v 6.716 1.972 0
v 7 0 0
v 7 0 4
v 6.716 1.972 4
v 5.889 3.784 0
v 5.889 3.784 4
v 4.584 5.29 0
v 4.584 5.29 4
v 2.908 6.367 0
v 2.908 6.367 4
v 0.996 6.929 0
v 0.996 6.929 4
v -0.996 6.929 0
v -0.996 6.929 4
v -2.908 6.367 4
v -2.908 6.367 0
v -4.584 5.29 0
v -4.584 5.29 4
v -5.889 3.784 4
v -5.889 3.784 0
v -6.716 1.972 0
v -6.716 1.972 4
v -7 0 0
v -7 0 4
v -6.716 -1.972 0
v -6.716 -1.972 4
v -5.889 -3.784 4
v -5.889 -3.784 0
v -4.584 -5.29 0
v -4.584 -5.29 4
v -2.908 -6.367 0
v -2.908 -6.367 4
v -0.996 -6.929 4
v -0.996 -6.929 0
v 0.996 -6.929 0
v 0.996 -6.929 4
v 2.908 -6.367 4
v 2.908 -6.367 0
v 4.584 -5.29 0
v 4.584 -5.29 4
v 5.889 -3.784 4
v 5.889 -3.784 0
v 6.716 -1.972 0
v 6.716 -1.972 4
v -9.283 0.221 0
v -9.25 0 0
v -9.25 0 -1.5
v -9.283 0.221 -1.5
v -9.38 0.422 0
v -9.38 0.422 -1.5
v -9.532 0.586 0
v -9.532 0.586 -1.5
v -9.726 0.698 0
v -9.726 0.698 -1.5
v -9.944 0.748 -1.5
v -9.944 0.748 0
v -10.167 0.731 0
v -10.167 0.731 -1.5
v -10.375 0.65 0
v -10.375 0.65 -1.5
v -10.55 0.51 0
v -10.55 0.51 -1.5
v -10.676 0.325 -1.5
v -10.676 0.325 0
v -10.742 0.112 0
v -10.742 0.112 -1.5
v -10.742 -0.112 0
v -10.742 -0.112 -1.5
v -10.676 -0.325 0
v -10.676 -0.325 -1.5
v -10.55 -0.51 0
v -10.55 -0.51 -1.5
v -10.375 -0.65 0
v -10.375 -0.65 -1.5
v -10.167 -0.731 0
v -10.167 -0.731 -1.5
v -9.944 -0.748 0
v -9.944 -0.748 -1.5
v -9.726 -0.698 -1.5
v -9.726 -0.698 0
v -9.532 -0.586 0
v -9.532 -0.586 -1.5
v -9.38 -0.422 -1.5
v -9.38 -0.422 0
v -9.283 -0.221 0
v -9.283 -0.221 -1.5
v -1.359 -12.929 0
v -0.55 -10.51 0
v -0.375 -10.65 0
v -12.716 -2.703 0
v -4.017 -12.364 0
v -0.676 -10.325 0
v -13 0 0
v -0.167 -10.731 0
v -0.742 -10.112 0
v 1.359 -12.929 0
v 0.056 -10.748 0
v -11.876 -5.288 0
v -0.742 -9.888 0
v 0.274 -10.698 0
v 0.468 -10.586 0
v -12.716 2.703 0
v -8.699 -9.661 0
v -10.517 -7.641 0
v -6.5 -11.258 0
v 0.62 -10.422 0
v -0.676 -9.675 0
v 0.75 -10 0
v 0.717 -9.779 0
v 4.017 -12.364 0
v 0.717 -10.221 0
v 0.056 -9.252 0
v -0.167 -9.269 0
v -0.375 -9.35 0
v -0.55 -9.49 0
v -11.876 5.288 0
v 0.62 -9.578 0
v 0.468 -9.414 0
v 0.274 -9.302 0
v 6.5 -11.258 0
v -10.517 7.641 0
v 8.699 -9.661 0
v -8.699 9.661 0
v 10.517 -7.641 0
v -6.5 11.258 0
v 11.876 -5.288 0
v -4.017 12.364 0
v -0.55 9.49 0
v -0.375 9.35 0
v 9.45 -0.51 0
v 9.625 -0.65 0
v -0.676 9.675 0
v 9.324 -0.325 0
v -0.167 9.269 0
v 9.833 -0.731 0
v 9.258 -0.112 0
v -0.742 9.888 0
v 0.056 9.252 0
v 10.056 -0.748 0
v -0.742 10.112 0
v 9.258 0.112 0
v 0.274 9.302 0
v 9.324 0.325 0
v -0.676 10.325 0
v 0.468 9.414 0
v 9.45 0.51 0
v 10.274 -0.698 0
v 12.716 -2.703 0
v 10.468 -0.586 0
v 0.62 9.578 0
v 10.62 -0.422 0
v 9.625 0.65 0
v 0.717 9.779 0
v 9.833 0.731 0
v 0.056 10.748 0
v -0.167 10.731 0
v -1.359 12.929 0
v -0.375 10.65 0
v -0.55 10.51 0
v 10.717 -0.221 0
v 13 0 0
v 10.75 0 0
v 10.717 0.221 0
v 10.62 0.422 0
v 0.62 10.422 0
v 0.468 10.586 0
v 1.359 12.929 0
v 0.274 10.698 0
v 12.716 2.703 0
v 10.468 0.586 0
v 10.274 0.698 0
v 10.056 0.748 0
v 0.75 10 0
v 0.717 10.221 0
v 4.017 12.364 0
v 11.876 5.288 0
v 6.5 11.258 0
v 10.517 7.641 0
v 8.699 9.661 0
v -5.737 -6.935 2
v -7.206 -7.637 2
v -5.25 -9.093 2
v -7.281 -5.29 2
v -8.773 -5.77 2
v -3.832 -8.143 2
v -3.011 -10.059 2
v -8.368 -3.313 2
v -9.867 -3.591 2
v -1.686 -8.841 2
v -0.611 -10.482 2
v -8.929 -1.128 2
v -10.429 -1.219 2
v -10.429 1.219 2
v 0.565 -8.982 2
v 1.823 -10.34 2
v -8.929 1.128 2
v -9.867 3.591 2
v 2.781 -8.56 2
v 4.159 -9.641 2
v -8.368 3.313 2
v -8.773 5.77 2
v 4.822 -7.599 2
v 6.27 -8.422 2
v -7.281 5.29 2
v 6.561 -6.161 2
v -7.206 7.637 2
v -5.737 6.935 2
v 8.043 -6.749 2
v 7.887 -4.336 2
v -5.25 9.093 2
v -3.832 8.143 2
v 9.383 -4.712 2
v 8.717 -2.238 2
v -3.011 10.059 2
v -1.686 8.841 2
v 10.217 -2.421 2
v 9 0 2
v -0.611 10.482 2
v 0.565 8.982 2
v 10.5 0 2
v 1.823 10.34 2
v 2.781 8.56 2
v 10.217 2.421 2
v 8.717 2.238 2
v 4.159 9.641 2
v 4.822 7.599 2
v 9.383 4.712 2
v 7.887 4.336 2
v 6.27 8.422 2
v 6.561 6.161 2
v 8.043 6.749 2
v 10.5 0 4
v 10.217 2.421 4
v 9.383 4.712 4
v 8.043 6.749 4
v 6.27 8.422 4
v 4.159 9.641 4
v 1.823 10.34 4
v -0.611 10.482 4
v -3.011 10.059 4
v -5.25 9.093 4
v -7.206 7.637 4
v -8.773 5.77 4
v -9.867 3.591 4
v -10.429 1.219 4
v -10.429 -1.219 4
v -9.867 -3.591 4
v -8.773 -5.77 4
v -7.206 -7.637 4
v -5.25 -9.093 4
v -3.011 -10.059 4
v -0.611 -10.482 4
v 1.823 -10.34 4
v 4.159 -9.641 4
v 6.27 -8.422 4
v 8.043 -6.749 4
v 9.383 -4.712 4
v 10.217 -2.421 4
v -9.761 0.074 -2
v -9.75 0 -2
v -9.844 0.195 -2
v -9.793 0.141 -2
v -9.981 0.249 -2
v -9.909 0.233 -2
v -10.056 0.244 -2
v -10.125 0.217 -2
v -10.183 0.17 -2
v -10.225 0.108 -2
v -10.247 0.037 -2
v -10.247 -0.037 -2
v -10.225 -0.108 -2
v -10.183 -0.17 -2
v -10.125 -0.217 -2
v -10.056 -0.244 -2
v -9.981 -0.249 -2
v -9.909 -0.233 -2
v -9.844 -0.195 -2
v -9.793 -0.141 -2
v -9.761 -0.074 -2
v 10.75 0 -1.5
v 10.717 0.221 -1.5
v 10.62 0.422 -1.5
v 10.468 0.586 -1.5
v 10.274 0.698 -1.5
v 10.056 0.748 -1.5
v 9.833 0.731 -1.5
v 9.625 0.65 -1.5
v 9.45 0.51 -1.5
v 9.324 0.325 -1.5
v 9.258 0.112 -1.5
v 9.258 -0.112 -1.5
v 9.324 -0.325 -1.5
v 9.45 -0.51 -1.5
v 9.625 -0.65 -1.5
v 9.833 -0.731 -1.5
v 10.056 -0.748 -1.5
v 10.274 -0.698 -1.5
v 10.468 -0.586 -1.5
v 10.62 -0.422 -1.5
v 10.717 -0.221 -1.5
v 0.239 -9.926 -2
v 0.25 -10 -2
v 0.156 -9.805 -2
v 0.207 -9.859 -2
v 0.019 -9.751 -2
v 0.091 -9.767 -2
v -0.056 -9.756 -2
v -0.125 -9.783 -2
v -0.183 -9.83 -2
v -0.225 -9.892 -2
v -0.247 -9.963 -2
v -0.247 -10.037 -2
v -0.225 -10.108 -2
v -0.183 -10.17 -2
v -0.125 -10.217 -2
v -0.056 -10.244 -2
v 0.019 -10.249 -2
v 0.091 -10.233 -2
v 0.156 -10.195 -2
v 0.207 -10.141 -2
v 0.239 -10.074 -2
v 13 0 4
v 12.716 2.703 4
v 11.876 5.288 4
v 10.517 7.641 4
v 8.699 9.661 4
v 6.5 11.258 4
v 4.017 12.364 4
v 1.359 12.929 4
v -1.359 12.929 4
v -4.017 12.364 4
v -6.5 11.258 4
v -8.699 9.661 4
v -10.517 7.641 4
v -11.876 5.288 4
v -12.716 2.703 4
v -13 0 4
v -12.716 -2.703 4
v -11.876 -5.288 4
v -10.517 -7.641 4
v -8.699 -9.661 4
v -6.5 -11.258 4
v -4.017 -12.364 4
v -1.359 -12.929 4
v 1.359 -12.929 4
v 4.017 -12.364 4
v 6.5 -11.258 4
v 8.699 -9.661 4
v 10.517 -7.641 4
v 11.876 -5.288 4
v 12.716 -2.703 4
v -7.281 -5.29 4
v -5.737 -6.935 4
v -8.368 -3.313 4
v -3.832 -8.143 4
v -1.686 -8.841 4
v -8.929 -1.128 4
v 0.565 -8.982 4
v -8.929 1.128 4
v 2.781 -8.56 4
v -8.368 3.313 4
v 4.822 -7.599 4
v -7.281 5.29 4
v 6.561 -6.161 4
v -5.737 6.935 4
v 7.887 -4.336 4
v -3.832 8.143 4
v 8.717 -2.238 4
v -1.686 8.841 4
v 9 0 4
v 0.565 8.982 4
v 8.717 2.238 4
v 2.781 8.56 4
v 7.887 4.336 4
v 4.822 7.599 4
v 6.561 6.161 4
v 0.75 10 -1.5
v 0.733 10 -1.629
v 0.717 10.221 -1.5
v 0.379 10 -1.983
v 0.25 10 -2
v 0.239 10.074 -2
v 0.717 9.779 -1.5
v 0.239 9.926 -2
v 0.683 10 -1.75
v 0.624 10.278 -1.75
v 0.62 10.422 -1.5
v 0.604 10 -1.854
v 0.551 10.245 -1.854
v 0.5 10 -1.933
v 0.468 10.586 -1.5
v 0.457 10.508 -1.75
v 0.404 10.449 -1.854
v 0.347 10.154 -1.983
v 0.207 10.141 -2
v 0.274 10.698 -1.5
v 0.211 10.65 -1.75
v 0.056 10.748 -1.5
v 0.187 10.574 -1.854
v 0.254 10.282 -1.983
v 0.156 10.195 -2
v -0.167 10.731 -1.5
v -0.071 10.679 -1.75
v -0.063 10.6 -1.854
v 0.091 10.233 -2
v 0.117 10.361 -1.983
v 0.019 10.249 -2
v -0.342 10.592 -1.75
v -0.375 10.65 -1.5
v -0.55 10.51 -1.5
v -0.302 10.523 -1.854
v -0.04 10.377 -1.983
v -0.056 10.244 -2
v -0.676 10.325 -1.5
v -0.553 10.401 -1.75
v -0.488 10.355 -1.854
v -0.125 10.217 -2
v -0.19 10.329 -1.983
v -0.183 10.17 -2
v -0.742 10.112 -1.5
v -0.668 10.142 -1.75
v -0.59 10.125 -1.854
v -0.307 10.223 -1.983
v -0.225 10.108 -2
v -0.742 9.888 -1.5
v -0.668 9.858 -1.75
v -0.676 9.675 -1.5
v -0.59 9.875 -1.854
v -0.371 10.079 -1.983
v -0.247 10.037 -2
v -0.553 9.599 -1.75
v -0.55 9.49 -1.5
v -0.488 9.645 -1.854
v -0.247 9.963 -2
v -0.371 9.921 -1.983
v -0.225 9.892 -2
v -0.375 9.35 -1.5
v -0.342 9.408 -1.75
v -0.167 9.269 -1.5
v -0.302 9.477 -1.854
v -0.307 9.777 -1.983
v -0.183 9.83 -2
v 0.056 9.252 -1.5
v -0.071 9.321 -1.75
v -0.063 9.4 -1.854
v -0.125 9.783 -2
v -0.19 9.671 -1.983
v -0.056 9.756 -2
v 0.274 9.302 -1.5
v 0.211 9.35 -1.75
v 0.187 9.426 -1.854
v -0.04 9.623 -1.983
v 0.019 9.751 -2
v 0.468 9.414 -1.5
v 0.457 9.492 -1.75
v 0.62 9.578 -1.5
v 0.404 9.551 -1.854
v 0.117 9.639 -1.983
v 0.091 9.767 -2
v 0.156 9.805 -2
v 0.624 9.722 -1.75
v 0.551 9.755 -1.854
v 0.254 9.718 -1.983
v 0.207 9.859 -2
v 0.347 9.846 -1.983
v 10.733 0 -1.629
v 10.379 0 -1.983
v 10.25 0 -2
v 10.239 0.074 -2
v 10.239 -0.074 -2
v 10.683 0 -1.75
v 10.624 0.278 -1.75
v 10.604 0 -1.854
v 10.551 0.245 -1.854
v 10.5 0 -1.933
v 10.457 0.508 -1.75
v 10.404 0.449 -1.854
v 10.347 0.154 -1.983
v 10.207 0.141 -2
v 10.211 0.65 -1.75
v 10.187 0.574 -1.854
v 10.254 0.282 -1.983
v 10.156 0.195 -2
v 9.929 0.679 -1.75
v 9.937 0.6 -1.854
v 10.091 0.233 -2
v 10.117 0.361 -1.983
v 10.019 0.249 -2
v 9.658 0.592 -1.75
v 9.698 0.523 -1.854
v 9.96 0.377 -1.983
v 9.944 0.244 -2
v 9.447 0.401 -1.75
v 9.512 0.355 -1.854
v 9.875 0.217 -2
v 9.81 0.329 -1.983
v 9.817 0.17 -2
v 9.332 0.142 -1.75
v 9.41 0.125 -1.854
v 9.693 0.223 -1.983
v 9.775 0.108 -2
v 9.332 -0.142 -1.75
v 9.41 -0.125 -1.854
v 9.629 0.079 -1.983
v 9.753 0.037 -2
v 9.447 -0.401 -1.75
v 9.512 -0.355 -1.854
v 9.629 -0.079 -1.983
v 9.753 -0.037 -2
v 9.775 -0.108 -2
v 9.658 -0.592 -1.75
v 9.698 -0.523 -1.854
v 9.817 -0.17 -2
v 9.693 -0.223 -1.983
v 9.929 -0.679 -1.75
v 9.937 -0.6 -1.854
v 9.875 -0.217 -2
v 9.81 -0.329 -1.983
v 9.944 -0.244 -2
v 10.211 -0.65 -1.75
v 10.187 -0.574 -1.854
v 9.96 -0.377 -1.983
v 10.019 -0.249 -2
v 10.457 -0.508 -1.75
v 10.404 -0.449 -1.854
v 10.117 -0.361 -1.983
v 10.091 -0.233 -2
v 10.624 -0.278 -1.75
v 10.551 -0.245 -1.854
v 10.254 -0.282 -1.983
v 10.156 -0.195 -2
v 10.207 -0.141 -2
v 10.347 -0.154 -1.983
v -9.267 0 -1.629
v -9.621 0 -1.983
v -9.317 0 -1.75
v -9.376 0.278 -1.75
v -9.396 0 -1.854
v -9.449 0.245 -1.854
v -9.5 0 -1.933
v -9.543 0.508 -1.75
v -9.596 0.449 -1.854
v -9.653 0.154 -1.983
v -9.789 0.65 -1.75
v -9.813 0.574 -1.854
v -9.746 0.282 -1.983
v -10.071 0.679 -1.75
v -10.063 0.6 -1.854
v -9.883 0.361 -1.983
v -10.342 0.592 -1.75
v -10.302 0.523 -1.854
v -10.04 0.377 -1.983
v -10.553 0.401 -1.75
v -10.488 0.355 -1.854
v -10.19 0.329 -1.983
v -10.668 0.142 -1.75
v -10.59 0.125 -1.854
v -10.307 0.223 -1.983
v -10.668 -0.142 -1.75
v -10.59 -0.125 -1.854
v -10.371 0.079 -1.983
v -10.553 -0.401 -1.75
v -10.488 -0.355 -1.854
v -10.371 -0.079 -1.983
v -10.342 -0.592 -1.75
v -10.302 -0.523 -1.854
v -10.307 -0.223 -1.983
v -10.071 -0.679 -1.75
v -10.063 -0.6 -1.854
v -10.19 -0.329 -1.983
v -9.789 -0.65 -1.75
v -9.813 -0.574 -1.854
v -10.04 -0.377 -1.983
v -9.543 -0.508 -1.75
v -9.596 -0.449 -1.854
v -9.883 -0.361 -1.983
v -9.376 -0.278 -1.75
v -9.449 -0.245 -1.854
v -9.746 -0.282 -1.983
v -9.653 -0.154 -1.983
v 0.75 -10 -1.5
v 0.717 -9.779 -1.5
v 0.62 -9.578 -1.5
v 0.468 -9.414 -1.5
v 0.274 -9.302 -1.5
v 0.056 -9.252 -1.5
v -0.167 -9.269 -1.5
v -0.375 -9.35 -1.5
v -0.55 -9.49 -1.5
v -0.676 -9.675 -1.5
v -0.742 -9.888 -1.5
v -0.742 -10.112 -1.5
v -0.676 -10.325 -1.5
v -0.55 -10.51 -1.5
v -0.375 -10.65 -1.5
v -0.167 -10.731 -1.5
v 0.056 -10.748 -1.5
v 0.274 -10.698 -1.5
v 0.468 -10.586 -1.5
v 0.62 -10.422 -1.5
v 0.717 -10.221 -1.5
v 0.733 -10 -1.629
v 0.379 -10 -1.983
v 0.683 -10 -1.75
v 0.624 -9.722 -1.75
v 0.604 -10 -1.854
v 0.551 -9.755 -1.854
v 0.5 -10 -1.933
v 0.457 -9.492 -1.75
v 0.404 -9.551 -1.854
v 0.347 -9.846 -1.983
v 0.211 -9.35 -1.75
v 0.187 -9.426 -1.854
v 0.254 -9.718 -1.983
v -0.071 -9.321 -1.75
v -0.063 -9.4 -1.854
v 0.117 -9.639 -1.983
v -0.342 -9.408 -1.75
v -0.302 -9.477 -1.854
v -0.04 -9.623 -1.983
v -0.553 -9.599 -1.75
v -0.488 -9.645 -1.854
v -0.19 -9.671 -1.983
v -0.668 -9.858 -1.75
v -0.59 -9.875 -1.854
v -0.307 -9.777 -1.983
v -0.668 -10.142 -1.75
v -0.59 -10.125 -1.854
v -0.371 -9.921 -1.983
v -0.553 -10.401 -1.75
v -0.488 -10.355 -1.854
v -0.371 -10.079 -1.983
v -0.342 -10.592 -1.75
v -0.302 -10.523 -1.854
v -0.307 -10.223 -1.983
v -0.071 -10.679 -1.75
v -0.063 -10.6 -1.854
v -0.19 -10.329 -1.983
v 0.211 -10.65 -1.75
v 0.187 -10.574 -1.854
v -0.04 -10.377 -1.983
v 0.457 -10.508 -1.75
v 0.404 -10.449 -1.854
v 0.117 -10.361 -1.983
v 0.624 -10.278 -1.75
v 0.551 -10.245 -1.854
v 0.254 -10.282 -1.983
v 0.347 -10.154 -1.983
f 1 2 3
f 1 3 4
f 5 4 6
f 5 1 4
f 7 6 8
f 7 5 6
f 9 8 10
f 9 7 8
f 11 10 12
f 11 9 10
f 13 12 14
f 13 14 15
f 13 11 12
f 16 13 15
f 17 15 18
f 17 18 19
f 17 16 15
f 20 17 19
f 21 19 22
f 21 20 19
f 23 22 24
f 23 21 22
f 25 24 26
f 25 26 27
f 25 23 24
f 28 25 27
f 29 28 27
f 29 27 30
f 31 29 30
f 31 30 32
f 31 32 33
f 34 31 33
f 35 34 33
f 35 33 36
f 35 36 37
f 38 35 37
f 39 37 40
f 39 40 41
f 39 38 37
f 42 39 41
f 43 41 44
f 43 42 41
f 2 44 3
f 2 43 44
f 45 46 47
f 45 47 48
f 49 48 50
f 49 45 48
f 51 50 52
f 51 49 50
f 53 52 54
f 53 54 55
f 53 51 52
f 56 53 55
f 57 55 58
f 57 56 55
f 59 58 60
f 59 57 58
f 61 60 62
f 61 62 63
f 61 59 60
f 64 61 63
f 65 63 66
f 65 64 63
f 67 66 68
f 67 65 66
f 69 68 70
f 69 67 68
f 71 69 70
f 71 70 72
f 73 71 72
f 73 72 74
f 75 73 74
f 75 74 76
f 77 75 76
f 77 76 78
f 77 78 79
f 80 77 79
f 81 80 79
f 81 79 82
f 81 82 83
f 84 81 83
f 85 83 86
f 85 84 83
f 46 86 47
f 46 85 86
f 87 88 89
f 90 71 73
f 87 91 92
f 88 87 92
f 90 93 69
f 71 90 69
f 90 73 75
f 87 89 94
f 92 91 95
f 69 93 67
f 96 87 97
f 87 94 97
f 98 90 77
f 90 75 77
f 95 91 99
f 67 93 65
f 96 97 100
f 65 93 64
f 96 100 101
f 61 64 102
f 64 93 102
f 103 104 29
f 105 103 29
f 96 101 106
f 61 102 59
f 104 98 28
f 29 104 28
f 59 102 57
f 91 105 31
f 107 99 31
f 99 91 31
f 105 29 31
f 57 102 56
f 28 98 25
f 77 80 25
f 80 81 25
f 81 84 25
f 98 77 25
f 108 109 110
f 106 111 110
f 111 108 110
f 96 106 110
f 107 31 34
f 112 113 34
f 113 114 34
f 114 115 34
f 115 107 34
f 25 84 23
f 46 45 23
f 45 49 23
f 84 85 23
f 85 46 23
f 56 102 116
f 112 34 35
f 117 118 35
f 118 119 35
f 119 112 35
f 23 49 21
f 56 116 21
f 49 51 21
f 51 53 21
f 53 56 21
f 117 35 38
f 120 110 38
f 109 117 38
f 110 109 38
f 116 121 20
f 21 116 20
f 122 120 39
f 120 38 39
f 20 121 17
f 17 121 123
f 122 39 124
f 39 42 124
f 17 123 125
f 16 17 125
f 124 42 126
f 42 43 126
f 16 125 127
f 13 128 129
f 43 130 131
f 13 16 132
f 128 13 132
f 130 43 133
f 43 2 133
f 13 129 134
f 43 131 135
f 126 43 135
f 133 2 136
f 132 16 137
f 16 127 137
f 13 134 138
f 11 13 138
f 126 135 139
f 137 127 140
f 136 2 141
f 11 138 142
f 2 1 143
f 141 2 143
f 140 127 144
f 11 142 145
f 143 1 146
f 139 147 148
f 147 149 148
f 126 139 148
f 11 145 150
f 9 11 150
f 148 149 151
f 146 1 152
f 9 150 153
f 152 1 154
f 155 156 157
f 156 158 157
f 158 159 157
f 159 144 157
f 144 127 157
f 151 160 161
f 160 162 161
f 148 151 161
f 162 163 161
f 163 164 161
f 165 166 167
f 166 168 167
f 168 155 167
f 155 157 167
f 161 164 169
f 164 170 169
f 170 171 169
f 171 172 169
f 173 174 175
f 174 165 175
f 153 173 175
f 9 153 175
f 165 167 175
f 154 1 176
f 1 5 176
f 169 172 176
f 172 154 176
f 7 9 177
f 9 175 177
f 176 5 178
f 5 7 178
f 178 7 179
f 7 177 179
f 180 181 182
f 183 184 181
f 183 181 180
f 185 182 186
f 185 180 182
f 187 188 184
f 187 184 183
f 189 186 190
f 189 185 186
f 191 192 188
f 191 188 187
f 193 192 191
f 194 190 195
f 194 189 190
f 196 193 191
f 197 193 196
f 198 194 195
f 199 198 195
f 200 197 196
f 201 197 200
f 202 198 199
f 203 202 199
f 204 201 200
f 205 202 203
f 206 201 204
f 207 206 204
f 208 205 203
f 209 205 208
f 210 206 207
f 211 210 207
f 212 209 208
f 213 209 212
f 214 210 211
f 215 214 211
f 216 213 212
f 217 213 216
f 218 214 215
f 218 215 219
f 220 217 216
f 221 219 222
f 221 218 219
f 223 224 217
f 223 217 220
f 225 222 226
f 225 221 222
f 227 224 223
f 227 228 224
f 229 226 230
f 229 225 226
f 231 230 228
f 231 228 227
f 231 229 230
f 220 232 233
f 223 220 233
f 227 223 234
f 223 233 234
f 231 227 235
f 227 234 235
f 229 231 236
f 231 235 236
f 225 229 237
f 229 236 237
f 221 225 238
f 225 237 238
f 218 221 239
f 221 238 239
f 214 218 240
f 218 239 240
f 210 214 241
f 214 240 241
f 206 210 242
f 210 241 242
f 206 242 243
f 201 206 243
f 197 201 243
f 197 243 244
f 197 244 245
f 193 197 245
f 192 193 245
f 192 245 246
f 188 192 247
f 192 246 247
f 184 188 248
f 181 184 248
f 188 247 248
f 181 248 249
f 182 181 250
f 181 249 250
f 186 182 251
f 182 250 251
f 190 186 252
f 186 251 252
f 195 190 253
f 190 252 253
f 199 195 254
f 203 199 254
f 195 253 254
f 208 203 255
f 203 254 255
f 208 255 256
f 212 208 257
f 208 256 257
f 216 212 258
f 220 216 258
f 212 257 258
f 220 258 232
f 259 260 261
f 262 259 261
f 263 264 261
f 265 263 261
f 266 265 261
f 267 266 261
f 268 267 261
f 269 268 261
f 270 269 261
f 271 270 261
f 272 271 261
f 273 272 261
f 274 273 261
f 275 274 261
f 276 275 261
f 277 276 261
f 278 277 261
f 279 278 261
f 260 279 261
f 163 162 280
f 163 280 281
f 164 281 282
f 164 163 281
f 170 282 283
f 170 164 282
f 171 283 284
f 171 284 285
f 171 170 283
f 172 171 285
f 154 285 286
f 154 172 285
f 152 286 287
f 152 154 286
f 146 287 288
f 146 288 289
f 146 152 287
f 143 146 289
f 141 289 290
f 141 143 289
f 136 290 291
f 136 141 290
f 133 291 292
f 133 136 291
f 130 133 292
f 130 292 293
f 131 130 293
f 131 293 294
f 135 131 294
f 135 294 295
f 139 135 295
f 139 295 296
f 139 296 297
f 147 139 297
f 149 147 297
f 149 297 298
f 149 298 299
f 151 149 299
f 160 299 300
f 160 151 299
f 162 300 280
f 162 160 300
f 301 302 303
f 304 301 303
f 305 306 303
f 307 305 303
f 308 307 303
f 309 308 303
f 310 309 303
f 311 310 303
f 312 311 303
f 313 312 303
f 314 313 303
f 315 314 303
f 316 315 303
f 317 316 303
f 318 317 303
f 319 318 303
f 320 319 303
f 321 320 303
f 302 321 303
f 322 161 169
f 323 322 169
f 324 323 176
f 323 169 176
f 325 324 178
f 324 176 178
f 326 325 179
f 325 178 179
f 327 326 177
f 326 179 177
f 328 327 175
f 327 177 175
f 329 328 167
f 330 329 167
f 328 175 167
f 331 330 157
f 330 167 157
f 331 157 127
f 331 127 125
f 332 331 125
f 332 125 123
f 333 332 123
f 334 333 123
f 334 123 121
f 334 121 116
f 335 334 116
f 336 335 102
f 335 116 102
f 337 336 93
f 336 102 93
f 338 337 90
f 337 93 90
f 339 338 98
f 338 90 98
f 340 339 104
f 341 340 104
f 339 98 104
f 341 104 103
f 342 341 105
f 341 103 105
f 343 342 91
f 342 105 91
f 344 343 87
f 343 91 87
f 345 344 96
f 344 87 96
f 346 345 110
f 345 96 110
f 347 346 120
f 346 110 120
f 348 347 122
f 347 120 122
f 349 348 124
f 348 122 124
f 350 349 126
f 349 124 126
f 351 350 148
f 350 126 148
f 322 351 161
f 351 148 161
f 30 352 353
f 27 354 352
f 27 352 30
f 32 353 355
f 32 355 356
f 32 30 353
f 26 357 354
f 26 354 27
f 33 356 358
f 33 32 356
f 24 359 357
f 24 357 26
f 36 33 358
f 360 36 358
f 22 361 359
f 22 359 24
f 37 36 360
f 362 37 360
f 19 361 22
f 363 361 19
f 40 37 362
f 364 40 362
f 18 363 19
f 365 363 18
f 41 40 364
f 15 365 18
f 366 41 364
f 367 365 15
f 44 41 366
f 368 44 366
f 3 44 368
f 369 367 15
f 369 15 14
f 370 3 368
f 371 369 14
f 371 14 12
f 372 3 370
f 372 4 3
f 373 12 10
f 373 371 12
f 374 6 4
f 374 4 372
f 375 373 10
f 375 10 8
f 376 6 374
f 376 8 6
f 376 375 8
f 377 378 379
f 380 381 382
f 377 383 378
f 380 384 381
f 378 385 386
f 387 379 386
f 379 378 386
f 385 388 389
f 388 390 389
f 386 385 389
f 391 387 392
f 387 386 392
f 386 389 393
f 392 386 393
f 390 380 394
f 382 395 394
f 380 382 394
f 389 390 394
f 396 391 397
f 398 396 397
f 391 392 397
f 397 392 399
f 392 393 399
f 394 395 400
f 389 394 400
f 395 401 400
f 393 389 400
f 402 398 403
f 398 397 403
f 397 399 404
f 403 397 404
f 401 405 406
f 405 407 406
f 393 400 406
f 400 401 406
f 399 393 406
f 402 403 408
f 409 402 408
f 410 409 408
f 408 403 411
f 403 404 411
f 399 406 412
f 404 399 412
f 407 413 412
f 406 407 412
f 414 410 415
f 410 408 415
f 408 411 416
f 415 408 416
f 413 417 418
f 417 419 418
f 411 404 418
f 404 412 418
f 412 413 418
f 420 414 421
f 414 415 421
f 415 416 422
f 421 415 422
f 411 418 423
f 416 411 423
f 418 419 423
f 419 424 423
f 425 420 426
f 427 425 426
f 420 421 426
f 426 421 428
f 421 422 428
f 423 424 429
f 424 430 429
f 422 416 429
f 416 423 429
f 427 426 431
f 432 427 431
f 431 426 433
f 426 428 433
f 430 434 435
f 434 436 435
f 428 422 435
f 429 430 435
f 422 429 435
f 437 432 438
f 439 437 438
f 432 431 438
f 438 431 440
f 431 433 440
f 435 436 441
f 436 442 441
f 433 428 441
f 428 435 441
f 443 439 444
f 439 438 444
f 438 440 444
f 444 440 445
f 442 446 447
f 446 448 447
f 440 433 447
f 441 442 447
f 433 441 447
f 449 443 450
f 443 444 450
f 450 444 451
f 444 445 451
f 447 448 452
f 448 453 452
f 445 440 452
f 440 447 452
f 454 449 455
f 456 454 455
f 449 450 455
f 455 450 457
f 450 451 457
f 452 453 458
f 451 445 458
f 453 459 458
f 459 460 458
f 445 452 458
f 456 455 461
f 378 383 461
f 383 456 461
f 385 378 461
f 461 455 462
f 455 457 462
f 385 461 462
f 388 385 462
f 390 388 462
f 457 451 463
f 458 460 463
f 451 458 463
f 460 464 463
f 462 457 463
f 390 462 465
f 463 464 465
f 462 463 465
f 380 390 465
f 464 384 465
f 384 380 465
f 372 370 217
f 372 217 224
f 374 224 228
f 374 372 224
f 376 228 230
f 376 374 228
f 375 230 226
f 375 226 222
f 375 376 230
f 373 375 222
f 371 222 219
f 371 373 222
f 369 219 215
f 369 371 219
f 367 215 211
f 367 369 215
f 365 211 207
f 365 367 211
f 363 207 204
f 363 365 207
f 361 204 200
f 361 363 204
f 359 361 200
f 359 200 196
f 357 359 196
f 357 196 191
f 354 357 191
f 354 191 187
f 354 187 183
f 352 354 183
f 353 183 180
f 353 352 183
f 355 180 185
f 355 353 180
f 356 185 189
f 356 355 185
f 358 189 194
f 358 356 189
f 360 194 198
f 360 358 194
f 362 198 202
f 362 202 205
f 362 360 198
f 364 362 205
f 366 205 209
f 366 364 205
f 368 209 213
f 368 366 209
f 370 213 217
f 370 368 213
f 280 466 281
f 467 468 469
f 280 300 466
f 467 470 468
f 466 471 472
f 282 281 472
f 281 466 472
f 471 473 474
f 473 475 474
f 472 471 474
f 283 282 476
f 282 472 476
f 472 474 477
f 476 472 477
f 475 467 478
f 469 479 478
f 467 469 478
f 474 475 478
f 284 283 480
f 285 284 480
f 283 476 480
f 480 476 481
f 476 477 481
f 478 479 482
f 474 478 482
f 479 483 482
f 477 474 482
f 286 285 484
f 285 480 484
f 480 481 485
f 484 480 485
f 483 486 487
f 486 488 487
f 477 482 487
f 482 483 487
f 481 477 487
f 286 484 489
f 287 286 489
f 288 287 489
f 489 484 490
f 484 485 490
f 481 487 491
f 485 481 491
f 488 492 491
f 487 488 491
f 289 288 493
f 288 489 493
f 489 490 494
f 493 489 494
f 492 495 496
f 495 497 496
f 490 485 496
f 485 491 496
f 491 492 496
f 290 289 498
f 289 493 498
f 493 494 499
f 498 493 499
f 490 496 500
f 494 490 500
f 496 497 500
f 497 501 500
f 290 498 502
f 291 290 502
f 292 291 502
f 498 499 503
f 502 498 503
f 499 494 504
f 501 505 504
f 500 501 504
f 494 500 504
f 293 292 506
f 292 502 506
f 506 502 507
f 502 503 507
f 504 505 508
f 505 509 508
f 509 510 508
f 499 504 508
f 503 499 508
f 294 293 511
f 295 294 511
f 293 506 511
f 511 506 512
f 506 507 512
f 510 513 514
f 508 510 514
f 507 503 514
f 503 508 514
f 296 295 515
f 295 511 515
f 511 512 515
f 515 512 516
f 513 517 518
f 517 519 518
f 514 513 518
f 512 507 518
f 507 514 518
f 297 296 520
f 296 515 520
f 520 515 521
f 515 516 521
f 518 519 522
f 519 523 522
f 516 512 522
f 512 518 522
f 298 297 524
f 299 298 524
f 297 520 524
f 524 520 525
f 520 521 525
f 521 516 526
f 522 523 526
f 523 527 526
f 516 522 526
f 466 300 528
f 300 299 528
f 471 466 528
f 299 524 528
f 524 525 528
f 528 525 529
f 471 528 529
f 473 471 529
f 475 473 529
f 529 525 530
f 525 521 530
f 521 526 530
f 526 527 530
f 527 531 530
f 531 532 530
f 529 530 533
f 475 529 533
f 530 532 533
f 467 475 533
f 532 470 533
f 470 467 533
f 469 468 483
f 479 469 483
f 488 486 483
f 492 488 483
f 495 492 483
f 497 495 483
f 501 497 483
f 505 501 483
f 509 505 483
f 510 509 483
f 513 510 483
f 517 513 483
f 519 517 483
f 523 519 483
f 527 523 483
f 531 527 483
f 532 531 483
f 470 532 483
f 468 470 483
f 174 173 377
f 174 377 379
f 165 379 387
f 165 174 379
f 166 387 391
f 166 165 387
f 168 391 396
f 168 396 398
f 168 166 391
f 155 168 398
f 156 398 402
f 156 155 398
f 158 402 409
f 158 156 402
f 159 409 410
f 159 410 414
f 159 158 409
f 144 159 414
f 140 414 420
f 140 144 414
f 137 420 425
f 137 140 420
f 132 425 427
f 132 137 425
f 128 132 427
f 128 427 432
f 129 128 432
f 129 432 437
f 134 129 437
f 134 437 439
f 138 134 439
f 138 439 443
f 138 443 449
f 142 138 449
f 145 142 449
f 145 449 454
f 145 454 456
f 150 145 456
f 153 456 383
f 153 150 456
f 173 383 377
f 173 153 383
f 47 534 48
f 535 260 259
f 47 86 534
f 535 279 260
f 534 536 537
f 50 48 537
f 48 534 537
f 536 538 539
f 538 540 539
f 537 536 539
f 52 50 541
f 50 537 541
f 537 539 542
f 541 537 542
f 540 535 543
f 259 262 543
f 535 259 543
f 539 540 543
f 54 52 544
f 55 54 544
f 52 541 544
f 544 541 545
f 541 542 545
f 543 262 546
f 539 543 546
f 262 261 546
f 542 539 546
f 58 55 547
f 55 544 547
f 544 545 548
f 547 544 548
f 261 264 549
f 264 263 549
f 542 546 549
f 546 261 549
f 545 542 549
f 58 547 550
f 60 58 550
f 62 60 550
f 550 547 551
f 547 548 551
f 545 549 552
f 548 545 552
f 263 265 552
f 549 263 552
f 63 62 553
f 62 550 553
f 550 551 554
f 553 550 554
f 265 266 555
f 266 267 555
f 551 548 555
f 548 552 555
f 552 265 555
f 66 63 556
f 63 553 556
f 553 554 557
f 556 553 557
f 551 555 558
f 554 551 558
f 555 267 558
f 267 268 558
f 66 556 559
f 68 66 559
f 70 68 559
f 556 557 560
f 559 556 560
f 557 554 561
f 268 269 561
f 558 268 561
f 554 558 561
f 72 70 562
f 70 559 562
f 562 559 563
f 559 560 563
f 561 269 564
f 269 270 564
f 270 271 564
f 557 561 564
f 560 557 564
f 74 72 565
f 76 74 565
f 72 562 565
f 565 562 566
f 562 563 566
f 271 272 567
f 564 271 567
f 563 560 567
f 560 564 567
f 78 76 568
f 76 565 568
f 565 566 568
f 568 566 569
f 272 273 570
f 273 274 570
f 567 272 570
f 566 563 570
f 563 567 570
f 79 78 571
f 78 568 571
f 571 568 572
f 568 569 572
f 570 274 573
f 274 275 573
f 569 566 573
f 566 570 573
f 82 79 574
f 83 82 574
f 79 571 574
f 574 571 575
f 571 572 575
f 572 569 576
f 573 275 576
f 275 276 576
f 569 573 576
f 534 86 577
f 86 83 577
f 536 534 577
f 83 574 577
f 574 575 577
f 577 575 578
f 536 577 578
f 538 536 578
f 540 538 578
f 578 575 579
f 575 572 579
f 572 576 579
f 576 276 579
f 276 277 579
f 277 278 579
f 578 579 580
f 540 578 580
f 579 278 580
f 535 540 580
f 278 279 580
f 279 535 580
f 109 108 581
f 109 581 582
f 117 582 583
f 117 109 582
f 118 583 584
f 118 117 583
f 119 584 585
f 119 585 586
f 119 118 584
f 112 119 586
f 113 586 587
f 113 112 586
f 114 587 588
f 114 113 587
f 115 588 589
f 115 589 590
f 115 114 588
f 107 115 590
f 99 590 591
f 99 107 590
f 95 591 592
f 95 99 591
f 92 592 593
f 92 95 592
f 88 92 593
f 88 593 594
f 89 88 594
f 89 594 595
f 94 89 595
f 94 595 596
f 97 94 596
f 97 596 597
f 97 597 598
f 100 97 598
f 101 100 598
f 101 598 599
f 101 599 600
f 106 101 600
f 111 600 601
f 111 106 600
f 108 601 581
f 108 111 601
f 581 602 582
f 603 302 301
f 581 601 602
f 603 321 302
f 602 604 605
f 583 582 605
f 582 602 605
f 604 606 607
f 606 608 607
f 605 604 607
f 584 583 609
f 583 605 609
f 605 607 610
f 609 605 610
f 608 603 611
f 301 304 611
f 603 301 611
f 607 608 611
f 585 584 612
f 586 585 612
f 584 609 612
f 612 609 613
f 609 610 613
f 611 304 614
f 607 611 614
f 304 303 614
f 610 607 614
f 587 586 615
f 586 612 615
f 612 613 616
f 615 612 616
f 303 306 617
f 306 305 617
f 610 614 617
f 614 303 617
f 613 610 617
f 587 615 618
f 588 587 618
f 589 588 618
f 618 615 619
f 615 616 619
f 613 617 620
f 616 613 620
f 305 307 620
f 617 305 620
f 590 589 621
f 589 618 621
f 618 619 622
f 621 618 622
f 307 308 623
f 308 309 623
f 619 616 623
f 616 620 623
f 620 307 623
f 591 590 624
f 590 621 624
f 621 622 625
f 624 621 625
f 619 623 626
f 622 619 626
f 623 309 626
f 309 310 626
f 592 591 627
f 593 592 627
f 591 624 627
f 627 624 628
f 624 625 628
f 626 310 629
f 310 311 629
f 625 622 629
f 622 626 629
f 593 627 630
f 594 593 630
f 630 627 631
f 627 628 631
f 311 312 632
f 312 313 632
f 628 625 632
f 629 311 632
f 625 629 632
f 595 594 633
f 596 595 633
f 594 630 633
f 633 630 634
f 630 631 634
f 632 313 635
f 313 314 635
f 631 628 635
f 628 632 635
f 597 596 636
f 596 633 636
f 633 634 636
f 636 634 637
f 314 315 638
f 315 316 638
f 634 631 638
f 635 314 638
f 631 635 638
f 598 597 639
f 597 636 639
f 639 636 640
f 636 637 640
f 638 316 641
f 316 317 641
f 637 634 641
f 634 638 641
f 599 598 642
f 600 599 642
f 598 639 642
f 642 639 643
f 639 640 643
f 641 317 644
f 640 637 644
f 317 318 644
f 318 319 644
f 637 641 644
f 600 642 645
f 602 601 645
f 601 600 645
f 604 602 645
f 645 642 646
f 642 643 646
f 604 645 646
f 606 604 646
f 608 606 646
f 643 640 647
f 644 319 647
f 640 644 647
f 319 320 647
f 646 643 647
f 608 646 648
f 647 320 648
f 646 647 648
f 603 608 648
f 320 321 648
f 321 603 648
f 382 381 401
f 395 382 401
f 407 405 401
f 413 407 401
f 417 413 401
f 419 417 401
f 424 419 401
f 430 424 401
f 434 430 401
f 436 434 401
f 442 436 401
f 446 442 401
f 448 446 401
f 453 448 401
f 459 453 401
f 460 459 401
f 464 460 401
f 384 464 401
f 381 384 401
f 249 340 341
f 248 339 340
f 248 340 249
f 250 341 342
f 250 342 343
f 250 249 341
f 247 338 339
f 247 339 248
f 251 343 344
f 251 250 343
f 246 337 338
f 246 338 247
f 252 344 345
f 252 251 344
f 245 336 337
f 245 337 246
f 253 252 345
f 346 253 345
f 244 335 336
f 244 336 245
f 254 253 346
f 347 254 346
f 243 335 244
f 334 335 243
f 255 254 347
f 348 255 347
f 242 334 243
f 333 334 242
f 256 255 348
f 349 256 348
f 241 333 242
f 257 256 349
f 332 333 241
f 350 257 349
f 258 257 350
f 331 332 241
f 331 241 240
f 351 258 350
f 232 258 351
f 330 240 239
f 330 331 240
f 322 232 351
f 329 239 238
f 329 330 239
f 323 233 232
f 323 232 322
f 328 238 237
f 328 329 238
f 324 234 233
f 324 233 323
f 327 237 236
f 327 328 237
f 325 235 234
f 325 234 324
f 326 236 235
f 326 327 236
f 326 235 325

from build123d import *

# Parameters (mm, degrees)
F0_R     = 13
F0_R_2   = 7
F1_DEPTH = 4
F2_R     = 0.75
F3_DEPTH = 2
F4_R     = 0.5
F5_R     = 10.5
F5_R_2   = 9
F6_DEPTH = 2


with BuildPart() as f1:
    # F0 (on Top) → F1 (new body)
    with BuildSketch(Plane.XY):
        Circle(F0_R)
        Circle(F0_R_2, mode=Mode.SUBTRACT)
    extrude(amount=F1_DEPTH)

    # F2 (on Top) → F3 (join)
    with BuildSketch(Plane.XY):
        with Locations((0, -10)):
            Circle(F2_R)
        with Locations((-10, 0)):
            Circle(F2_R)
        with Locations((0, 10)):
            Circle(F2_R)
        with Locations((10, 0)):
            Circle(F2_R)
    extrude(amount=-F3_DEPTH)

    # F4
    f4_edges = [f1.edges().sort_by_distance(p)[0] for p in [
        (-10.75, 0, -2),
        (-0.75, -10, -2),
        (9.25, 0, -2),
        (-0.75, 10, -2),
    ]]
    fillet(f4_edges, radius=F4_R)

    # F5 (on face) → F6 (cut)
    with BuildSketch(Plane.XY.offset(4)):
        Circle(F5_R)
        Circle(F5_R_2, mode=Mode.SUBTRACT)
    extrude(amount=-F6_DEPTH, mode=Mode.SUBTRACT)


solid = f1.part
